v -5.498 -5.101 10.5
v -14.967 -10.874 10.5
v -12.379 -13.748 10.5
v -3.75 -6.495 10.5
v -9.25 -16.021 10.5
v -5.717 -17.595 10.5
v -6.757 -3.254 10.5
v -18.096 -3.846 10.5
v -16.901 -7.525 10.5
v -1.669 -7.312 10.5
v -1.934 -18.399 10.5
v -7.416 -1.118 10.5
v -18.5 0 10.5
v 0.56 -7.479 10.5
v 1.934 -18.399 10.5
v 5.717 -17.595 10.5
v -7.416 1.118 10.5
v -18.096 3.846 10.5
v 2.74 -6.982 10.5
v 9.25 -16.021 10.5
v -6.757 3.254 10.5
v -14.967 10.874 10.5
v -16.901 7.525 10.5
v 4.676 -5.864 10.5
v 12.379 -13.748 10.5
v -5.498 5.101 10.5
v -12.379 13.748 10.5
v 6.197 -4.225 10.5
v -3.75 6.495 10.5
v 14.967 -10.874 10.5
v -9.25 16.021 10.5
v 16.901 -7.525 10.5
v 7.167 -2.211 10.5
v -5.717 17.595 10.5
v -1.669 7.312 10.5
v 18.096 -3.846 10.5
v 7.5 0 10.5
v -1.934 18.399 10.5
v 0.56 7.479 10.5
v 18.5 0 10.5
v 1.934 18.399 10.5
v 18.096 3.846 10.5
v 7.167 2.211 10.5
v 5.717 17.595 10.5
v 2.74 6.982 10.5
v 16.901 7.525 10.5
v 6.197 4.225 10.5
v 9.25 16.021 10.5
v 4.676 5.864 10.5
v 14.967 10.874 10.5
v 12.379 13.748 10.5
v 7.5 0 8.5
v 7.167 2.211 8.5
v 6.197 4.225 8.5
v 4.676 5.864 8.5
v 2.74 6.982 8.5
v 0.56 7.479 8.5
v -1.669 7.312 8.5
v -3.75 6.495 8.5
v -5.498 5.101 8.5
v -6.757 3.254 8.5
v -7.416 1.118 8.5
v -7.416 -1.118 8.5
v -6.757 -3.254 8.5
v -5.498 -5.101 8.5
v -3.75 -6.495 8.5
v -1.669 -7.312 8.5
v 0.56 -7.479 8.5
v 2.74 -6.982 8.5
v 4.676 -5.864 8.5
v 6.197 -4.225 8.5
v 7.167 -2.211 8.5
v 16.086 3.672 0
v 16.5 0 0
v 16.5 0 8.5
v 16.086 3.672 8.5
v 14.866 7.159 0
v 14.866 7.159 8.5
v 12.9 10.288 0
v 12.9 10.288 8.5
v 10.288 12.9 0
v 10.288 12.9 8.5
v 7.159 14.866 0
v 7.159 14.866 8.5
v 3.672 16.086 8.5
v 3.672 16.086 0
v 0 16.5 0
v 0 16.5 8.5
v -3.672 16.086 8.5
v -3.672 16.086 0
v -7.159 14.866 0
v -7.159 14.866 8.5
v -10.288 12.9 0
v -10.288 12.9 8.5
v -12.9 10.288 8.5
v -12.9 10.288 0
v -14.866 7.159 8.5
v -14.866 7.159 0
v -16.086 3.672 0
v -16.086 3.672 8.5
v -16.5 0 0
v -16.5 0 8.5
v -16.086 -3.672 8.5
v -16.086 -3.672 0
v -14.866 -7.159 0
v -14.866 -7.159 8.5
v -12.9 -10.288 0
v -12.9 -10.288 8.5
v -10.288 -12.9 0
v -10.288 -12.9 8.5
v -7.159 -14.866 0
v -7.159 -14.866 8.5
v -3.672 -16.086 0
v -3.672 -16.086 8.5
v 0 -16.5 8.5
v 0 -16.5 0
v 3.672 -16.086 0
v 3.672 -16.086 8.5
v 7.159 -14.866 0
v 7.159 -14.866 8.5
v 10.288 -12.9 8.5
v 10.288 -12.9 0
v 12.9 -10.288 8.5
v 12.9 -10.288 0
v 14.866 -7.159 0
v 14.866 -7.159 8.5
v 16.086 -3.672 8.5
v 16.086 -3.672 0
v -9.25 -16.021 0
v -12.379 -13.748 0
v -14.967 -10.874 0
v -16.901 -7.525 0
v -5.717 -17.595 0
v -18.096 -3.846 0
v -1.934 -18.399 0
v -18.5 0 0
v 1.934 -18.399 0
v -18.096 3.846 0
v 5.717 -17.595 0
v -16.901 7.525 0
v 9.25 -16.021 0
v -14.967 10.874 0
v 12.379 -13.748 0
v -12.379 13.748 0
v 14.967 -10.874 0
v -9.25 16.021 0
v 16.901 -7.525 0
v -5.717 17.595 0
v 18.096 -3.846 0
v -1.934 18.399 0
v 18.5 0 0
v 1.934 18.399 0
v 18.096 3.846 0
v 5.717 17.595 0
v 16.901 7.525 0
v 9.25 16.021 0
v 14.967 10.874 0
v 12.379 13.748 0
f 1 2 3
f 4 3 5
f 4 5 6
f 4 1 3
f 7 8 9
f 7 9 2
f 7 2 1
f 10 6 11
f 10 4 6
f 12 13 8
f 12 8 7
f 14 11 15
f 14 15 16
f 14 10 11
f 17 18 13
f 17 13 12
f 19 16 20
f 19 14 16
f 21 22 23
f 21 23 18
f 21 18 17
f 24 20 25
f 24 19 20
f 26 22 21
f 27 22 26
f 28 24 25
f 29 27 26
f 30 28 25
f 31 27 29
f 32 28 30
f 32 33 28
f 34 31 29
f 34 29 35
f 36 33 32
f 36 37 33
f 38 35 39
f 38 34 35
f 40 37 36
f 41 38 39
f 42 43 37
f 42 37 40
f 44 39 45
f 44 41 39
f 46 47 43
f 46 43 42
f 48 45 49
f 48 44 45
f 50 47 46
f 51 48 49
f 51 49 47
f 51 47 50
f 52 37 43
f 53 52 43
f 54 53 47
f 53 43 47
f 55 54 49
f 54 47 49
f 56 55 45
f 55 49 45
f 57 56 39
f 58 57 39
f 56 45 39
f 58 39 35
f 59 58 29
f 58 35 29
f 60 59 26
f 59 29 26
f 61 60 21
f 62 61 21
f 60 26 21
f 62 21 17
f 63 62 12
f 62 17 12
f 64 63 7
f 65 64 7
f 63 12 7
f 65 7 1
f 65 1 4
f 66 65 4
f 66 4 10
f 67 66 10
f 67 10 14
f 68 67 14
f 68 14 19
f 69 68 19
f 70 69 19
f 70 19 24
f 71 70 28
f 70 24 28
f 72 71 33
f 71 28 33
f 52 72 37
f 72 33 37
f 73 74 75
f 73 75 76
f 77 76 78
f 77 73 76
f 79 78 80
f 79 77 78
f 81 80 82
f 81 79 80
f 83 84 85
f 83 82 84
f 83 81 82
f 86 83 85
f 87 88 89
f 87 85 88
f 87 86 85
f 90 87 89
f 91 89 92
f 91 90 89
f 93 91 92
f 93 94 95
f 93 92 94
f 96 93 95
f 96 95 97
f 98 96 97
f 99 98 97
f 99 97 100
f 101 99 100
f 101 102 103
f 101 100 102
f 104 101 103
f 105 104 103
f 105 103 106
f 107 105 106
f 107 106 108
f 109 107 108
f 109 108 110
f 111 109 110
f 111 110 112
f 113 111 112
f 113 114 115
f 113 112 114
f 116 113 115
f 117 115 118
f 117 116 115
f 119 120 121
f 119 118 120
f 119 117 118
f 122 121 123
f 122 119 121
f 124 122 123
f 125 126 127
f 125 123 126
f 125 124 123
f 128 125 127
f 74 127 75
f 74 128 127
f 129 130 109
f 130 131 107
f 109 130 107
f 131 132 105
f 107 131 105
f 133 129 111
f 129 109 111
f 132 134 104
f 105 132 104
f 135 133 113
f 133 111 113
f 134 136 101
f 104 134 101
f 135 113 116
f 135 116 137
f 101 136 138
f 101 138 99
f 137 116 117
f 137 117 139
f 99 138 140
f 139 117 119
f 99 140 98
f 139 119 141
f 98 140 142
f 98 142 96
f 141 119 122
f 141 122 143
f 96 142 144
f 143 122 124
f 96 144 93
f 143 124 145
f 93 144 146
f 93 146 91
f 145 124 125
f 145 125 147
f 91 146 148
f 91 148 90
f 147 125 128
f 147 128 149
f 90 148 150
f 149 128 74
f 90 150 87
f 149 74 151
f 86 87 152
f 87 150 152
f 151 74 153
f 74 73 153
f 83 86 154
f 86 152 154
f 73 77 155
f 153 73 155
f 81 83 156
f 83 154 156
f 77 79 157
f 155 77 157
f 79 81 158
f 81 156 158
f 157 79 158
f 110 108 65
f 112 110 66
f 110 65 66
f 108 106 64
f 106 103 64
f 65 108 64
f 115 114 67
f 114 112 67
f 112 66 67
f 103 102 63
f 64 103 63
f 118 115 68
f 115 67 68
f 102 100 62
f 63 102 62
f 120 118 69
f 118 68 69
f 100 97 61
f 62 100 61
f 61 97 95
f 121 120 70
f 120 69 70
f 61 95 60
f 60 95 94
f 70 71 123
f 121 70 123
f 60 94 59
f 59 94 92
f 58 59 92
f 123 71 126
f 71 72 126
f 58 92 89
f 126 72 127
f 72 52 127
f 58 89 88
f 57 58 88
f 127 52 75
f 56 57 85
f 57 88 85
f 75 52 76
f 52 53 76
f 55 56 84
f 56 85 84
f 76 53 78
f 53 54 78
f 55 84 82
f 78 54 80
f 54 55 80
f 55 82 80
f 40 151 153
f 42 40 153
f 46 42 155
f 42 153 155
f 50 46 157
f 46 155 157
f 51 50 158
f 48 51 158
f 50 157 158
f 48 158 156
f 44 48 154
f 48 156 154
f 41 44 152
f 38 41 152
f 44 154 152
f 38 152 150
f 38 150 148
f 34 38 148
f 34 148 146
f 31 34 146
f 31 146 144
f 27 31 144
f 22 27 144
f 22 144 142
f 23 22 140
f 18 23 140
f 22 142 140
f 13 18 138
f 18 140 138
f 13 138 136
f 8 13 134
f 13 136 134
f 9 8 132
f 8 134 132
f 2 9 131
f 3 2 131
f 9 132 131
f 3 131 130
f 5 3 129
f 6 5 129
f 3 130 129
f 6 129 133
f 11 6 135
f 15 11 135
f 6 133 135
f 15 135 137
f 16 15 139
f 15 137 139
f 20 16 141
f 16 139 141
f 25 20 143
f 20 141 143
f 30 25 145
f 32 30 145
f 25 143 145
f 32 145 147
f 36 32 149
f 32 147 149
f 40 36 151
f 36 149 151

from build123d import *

# Parameters (mm, degrees)
F0_R     = 18.5
F1_DEPTH = 10.5
F2_T     = -2
F3_R     = 7.5
F4_DEPTH = 2


with BuildPart() as f1:
    # F0 (on Top) → F1 (new body)
    with BuildSketch(Plane.XY):
        Circle(F0_R)
    extrude(amount=F1_DEPTH)

    # F2
    f2_openings = [f1.faces().sort_by_distance(p)[0] for p in [
        (0, 0, 0),
    ]]
    offset(amount=F2_T, openings=f2_openings)

    # F3 (on face) → F4 (cut, through all)
    with BuildSketch(Plane.XY.offset(10.5)):
        Circle(F3_R)
    extrude(amount=-F4_DEPTH, mode=Mode.SUBTRACT)


solid = f1.part
